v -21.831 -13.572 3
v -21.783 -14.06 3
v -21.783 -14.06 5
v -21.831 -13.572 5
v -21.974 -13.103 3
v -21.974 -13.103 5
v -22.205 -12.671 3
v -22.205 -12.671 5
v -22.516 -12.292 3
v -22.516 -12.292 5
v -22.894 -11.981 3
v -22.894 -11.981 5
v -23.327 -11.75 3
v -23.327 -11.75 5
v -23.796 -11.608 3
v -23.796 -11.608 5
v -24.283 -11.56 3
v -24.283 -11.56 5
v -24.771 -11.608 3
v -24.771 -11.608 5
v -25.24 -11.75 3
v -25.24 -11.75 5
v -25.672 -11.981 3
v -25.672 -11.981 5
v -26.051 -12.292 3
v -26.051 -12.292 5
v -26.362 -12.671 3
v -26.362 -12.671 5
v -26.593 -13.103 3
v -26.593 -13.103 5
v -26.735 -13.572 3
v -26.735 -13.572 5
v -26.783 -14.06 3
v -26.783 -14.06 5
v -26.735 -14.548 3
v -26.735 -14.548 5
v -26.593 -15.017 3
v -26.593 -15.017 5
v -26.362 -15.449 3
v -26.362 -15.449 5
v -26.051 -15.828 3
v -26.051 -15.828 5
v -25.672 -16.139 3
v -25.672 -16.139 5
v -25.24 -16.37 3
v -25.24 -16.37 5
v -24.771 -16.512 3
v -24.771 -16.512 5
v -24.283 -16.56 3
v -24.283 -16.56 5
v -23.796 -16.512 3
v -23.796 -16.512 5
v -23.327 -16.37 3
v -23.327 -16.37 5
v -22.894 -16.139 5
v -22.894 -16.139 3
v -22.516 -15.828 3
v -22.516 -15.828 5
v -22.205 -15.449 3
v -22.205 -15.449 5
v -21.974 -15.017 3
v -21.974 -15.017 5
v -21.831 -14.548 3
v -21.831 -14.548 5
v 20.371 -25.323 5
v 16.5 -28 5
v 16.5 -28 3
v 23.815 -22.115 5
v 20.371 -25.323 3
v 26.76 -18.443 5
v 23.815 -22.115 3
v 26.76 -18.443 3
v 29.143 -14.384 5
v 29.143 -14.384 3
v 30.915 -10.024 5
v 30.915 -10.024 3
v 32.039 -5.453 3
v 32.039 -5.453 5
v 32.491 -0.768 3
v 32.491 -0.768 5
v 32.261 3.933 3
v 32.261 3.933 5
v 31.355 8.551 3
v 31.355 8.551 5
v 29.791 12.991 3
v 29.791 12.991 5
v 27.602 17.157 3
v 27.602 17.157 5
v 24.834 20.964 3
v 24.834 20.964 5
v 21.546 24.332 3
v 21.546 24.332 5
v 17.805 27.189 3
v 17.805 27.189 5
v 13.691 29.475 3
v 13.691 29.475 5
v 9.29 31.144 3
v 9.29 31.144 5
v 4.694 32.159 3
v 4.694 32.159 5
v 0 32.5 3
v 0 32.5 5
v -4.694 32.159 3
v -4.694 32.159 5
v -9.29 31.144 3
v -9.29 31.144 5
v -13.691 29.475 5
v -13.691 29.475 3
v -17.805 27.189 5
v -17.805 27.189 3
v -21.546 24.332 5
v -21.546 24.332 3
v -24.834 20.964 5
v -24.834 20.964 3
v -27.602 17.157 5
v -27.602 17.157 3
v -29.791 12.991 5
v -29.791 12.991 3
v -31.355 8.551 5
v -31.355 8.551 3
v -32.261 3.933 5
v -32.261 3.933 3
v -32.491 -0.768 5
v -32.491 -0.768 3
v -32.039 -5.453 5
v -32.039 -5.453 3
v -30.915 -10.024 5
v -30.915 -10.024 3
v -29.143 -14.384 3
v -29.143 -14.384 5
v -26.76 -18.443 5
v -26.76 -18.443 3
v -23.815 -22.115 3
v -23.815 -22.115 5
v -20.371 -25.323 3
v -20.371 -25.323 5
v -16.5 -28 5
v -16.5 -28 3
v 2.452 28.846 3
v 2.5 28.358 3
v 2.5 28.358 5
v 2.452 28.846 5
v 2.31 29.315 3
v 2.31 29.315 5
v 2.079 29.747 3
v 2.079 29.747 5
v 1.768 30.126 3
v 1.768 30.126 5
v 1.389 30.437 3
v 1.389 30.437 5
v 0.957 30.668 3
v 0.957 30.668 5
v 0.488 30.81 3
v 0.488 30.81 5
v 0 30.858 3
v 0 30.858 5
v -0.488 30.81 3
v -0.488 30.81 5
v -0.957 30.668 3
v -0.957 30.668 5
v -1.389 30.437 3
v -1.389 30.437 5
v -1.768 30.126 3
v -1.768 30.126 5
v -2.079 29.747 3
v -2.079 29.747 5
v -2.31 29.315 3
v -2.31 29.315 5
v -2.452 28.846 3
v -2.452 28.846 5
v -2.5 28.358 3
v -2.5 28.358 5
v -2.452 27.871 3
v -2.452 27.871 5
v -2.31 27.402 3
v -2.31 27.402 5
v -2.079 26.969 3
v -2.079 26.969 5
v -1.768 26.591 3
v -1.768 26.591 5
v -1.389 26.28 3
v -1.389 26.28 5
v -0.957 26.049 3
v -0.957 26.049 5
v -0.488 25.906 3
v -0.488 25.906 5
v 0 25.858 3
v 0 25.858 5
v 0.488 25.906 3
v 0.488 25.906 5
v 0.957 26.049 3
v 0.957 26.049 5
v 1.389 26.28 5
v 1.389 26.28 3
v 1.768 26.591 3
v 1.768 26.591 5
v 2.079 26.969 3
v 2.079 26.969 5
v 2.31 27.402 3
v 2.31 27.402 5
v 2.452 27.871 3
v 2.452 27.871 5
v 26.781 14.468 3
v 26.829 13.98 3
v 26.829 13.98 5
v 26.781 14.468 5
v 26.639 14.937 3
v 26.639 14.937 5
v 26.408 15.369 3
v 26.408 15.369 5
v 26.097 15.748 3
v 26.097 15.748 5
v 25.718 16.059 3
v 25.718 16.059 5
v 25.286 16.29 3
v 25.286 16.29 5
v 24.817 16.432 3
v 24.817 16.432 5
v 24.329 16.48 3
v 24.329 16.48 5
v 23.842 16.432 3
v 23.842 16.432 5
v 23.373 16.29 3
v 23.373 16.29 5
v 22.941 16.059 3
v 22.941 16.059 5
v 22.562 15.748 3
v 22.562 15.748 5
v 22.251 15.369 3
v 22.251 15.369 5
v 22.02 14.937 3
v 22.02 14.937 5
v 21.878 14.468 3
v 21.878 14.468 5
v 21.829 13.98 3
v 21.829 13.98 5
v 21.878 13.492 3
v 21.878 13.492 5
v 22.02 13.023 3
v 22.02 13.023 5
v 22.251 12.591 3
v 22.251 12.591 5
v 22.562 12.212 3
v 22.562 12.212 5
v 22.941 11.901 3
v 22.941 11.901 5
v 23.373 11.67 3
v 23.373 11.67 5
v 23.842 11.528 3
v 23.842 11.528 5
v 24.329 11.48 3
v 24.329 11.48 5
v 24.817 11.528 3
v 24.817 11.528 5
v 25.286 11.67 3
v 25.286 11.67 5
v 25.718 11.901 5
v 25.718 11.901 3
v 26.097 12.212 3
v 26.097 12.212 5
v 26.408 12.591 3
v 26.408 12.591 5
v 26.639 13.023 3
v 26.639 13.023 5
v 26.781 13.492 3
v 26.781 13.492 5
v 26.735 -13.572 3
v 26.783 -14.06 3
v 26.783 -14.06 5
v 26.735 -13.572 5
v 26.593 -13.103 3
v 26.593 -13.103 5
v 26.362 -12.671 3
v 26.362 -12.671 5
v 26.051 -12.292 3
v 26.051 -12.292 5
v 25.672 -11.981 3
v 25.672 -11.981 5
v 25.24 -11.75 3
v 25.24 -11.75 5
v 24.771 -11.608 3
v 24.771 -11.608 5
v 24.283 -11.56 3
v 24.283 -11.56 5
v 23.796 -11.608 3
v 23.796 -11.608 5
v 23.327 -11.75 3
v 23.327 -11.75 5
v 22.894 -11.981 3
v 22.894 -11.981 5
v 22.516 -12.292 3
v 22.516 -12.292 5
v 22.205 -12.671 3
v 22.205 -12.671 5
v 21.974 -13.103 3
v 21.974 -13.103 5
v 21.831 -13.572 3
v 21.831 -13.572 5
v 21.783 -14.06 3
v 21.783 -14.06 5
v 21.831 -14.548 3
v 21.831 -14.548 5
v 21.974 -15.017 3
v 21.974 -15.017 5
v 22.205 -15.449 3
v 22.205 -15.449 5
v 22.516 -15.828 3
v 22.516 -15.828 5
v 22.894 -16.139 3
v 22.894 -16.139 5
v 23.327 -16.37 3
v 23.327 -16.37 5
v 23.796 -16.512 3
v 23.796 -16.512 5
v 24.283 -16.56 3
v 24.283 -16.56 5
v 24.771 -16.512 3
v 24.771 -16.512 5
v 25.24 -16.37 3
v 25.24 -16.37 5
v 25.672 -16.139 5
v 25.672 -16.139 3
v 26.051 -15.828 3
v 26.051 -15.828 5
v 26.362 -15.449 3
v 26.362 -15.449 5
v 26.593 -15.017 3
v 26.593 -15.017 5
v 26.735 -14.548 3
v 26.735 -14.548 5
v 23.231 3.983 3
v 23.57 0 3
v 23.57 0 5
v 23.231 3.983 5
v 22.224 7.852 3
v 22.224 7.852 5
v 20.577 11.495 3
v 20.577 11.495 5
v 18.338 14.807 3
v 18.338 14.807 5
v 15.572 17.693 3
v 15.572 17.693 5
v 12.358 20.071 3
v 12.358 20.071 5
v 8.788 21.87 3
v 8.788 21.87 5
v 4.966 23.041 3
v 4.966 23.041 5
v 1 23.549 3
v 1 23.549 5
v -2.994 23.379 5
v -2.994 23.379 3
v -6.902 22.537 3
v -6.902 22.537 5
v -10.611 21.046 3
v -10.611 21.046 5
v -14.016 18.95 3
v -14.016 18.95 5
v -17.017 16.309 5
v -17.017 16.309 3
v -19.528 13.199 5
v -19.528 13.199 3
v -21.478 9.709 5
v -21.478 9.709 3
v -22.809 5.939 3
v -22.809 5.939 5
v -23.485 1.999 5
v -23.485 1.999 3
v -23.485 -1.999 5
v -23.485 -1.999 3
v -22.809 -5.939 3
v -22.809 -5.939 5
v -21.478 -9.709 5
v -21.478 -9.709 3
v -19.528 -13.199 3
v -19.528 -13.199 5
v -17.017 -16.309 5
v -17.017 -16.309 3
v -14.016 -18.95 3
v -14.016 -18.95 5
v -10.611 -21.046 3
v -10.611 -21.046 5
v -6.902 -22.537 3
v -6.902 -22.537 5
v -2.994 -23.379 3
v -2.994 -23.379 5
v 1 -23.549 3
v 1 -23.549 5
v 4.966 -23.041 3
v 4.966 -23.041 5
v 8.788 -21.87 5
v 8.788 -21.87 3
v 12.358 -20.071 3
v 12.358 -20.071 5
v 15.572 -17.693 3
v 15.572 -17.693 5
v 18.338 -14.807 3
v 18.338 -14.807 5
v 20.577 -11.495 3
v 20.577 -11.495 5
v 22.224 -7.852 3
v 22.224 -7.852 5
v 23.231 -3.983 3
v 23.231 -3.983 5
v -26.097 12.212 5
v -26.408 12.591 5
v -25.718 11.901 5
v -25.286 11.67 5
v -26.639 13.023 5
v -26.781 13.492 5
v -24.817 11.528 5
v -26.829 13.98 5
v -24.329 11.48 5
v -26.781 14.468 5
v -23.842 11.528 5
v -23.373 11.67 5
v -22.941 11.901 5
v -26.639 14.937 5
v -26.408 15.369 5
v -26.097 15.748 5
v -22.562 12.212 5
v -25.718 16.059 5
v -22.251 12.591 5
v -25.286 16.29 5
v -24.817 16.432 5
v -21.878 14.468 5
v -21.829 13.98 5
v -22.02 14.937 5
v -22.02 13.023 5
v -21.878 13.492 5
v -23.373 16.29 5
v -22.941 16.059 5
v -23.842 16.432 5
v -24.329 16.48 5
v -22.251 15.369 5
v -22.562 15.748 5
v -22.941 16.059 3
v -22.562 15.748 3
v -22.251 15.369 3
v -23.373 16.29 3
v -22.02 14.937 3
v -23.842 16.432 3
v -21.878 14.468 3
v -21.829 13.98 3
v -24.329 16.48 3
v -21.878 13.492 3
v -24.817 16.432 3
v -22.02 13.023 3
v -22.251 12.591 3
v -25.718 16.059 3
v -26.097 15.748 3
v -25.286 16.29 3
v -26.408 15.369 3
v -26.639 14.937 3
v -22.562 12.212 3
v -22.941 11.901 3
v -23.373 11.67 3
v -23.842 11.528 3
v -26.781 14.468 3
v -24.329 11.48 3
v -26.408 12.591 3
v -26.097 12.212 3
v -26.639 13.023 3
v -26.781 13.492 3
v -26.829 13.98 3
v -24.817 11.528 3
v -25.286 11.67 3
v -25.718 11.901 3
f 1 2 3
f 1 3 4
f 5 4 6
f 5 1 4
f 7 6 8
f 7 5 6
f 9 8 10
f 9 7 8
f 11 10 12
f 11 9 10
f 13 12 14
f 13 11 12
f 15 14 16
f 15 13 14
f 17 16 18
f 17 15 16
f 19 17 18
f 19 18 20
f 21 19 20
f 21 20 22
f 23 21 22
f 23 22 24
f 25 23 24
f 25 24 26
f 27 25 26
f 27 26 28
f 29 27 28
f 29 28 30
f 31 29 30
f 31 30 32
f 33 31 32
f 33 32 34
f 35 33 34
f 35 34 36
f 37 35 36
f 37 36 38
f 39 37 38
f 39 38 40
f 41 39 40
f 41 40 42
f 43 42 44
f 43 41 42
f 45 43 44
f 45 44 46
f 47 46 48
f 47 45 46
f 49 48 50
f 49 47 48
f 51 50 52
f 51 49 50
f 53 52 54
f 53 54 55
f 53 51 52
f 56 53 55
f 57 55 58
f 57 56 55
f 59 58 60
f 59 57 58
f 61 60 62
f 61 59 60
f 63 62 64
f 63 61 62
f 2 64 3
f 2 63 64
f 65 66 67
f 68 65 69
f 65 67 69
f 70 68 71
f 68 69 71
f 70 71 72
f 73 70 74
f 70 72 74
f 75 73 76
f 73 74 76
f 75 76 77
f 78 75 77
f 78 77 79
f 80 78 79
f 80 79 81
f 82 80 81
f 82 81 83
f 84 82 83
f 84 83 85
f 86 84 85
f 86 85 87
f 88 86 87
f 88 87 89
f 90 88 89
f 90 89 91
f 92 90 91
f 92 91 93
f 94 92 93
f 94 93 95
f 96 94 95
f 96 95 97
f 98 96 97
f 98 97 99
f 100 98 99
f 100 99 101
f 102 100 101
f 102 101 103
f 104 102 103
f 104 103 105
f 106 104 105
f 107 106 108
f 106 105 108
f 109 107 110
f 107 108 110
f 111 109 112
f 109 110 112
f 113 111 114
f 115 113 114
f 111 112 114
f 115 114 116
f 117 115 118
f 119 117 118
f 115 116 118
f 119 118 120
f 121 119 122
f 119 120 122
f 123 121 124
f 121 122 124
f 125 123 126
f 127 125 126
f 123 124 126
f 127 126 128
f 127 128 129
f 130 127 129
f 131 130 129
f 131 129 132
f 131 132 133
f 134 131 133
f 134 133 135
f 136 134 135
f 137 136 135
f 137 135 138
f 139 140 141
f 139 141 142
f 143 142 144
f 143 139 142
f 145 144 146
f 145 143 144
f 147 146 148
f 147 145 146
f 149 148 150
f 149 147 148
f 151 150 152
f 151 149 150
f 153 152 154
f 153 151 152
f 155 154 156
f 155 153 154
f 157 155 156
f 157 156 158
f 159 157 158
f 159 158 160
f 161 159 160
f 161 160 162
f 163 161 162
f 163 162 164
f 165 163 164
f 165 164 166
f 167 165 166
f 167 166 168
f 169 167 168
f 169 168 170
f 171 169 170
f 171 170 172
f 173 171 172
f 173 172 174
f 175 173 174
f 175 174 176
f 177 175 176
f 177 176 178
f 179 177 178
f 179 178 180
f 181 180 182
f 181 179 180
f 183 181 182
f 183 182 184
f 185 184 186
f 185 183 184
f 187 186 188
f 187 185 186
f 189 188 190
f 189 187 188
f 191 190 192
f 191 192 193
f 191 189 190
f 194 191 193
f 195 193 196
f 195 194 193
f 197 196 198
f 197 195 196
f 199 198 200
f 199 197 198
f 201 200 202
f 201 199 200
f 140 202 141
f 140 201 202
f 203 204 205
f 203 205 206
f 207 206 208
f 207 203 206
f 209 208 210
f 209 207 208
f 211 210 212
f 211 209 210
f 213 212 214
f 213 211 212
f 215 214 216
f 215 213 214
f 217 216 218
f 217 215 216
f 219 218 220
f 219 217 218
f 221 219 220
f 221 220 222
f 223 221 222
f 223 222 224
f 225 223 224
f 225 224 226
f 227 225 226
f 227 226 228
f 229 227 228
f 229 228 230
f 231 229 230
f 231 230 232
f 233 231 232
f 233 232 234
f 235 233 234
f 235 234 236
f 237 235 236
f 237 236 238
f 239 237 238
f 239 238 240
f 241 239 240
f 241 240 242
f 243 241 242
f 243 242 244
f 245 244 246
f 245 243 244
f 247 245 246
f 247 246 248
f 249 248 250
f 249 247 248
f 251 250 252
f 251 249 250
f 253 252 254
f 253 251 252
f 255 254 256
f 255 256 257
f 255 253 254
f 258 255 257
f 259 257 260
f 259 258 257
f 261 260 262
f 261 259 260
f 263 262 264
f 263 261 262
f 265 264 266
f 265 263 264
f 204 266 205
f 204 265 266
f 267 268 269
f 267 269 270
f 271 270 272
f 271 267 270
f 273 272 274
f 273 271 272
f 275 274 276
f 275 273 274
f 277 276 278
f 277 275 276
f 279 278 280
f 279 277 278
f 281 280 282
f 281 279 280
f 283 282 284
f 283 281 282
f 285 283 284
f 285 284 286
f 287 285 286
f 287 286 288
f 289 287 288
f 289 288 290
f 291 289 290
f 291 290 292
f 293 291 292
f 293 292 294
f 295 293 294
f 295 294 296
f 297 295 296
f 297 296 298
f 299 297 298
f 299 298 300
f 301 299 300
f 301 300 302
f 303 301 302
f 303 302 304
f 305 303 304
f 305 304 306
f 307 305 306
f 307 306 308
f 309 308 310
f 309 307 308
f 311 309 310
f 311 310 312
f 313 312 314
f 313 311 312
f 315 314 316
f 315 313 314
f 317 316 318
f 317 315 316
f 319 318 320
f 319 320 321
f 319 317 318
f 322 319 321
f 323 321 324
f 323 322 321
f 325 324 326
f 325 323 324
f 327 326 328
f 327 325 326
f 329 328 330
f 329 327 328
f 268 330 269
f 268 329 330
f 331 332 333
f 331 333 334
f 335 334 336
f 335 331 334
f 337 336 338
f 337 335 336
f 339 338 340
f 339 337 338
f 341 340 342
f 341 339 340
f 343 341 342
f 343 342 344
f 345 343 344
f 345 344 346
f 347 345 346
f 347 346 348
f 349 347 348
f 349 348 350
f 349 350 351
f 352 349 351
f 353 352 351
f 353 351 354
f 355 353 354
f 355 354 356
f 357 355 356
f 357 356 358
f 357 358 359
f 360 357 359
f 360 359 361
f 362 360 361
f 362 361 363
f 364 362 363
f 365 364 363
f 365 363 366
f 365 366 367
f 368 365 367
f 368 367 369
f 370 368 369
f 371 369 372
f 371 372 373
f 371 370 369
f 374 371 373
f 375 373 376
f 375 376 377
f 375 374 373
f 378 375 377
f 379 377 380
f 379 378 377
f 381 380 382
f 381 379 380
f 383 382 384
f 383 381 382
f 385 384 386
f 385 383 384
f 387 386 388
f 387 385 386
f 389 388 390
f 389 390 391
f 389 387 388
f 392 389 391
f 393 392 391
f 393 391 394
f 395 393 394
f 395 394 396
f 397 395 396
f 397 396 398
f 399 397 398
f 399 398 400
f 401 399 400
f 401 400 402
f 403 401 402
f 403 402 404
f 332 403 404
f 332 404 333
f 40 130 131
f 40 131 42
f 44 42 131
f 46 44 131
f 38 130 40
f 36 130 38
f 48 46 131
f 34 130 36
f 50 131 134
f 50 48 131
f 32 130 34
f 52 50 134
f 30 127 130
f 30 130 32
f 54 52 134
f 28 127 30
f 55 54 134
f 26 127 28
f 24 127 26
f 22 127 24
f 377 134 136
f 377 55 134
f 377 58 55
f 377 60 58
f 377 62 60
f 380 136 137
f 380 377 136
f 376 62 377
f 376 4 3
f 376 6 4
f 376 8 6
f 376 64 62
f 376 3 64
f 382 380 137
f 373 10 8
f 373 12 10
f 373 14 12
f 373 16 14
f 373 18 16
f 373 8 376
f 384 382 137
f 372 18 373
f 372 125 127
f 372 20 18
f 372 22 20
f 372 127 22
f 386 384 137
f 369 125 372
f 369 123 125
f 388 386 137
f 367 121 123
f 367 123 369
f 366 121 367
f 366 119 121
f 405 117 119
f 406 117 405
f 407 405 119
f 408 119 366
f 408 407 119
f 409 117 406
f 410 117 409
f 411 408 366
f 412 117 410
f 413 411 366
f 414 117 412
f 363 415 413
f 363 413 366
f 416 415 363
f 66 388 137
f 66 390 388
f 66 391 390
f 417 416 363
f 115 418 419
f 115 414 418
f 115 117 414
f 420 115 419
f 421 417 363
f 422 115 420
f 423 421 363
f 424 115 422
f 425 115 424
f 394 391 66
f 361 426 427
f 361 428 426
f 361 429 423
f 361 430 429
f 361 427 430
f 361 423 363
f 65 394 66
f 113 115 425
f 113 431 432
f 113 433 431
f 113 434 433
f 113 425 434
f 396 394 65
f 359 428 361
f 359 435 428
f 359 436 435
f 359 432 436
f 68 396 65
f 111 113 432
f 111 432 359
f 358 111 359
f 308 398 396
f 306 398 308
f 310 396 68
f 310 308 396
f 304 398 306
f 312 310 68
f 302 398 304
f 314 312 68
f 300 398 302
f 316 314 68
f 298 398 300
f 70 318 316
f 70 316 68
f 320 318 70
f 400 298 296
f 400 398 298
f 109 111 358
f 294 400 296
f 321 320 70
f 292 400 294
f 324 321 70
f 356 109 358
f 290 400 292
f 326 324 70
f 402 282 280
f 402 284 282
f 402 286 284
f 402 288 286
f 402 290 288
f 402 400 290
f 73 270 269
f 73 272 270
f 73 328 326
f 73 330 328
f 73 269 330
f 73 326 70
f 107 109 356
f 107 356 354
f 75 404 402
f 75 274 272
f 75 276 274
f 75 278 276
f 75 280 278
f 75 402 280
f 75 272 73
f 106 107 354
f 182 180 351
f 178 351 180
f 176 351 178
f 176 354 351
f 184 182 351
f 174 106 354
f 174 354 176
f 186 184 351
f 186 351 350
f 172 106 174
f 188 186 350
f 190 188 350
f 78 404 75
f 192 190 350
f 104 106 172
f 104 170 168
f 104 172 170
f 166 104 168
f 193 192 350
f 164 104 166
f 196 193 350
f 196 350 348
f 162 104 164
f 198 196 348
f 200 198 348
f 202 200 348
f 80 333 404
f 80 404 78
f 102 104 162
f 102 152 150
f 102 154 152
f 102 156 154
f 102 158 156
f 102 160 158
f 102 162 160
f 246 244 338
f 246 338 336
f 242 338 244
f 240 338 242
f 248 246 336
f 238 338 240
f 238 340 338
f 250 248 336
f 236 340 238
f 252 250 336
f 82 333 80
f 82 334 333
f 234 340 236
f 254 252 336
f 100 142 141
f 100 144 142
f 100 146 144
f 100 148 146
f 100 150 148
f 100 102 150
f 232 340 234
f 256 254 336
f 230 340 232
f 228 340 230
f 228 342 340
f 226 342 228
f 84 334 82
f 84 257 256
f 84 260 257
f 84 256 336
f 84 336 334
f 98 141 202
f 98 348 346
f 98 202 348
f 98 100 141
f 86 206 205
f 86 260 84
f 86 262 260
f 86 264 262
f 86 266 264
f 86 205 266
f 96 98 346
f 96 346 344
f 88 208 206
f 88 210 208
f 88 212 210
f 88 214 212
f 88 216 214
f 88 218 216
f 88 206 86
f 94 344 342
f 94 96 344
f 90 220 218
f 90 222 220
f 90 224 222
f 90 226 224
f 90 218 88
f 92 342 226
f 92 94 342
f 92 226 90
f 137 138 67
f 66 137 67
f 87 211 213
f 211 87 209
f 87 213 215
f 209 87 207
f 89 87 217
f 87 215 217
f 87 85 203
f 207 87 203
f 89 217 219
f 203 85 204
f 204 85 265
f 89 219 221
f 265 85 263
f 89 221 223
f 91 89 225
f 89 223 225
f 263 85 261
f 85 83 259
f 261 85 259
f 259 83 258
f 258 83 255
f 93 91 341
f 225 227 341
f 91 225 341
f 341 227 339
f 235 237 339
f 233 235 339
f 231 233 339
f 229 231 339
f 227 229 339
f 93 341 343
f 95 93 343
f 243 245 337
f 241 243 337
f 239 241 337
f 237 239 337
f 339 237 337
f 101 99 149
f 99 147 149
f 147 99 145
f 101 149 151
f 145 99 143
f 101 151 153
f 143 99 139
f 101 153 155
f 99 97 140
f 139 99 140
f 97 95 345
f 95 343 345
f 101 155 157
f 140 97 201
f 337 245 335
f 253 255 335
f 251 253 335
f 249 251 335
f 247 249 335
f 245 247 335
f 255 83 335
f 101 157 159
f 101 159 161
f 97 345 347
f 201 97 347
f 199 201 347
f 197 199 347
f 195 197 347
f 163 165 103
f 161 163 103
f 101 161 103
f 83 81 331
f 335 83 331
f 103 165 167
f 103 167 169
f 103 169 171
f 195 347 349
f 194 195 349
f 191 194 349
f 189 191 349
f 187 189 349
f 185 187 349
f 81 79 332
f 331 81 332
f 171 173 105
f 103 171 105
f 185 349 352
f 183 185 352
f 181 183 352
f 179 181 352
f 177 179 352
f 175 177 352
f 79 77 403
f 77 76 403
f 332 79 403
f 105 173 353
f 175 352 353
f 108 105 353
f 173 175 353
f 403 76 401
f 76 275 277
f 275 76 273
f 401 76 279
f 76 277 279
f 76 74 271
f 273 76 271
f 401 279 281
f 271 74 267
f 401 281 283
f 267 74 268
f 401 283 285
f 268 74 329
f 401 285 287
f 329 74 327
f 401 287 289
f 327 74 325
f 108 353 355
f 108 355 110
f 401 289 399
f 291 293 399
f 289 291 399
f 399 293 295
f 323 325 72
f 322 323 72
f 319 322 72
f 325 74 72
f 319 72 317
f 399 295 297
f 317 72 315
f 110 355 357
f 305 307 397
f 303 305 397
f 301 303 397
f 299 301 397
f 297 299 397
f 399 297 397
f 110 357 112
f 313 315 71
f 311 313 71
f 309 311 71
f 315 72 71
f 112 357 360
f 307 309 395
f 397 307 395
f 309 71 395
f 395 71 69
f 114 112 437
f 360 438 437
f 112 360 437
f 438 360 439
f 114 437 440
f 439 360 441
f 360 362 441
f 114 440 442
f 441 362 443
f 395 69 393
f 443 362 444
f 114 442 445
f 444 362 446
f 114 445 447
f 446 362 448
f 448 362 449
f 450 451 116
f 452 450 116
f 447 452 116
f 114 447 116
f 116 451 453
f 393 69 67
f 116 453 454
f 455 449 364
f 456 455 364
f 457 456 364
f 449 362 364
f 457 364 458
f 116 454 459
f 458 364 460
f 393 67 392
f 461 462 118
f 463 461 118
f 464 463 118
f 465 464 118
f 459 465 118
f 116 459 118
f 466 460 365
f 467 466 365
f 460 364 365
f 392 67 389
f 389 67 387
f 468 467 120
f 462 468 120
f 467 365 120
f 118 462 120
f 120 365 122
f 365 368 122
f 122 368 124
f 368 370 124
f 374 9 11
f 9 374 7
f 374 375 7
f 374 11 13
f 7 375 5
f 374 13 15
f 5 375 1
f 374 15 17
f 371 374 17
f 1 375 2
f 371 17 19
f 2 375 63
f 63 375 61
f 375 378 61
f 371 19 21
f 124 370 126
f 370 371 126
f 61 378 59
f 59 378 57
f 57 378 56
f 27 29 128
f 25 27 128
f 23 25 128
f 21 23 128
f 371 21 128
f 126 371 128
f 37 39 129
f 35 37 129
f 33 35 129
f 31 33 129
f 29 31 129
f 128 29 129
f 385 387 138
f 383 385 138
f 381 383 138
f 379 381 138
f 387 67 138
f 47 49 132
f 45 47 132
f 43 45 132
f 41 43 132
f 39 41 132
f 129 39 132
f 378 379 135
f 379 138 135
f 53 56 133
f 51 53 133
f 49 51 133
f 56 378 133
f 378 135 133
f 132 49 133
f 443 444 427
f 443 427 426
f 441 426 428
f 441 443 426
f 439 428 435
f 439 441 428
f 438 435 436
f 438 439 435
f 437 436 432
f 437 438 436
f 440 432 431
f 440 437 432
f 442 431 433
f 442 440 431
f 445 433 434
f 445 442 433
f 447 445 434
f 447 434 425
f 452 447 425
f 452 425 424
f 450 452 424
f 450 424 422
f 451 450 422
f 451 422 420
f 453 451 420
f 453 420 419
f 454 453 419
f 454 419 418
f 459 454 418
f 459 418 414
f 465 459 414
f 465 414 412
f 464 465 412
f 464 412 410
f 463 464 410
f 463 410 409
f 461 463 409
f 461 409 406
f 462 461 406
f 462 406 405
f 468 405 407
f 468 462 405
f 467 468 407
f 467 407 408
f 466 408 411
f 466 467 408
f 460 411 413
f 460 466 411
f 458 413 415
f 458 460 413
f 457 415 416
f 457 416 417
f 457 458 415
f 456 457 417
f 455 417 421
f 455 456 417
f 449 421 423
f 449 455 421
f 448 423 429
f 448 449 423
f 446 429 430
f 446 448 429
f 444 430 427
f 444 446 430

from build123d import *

# Parameters (mm, degrees)
SKETCH1_R           = 23.57
SKETCH1_R_2         = 2.5
BOSS_EXTRUDE1_DEPTH = 5
SKETCH2_W           = 65
SKETCH2_H           = 3
CUT_EXTRUDE1_DEPTH  = 70


with BuildPart() as part:
    # Sketch1 → Boss-Extrude1 (new body)
    with BuildSketch(Plane.XY):
        with BuildLine():
            Line((-16.5, -28), (16.5, -28))
            ThreePointArc((16.5, -28), (0, 32.5), (-16.5, -28))
        make_face()
        Circle(SKETCH1_R, mode=Mode.SUBTRACT)
        with Locations((24.283327614, -14.06)):
            Circle(SKETCH1_R_2, mode=Mode.SUBTRACT)
        with Locations((24.32947184, 13.98)):
            Circle(SKETCH1_R_2, mode=Mode.SUBTRACT)
        with Locations((0, 28.358420848)):
            Circle(SKETCH1_R_2, mode=Mode.SUBTRACT)
        with Locations((-24.32947184, 13.98)):
            Circle(SKETCH1_R_2, mode=Mode.SUBTRACT)
        with Locations((-24.283327614, -14.06)):
            Circle(SKETCH1_R_2, mode=Mode.SUBTRACT)
    extrude(amount=BOSS_EXTRUDE1_DEPTH)

    # Sketch2 → Cut-Extrude1 (cut)
    with BuildSketch(Plane(origin=(0, -28, 0), x_dir=(-1, 0, 0), z_dir=(0, -1, 0))):
        with Locations((0, -1.5)):
            Rectangle(SKETCH2_W, SKETCH2_H)
    extrude(amount=-CUT_EXTRUDE1_DEPTH, mode=Mode.SUBTRACT)


solid = part.part
